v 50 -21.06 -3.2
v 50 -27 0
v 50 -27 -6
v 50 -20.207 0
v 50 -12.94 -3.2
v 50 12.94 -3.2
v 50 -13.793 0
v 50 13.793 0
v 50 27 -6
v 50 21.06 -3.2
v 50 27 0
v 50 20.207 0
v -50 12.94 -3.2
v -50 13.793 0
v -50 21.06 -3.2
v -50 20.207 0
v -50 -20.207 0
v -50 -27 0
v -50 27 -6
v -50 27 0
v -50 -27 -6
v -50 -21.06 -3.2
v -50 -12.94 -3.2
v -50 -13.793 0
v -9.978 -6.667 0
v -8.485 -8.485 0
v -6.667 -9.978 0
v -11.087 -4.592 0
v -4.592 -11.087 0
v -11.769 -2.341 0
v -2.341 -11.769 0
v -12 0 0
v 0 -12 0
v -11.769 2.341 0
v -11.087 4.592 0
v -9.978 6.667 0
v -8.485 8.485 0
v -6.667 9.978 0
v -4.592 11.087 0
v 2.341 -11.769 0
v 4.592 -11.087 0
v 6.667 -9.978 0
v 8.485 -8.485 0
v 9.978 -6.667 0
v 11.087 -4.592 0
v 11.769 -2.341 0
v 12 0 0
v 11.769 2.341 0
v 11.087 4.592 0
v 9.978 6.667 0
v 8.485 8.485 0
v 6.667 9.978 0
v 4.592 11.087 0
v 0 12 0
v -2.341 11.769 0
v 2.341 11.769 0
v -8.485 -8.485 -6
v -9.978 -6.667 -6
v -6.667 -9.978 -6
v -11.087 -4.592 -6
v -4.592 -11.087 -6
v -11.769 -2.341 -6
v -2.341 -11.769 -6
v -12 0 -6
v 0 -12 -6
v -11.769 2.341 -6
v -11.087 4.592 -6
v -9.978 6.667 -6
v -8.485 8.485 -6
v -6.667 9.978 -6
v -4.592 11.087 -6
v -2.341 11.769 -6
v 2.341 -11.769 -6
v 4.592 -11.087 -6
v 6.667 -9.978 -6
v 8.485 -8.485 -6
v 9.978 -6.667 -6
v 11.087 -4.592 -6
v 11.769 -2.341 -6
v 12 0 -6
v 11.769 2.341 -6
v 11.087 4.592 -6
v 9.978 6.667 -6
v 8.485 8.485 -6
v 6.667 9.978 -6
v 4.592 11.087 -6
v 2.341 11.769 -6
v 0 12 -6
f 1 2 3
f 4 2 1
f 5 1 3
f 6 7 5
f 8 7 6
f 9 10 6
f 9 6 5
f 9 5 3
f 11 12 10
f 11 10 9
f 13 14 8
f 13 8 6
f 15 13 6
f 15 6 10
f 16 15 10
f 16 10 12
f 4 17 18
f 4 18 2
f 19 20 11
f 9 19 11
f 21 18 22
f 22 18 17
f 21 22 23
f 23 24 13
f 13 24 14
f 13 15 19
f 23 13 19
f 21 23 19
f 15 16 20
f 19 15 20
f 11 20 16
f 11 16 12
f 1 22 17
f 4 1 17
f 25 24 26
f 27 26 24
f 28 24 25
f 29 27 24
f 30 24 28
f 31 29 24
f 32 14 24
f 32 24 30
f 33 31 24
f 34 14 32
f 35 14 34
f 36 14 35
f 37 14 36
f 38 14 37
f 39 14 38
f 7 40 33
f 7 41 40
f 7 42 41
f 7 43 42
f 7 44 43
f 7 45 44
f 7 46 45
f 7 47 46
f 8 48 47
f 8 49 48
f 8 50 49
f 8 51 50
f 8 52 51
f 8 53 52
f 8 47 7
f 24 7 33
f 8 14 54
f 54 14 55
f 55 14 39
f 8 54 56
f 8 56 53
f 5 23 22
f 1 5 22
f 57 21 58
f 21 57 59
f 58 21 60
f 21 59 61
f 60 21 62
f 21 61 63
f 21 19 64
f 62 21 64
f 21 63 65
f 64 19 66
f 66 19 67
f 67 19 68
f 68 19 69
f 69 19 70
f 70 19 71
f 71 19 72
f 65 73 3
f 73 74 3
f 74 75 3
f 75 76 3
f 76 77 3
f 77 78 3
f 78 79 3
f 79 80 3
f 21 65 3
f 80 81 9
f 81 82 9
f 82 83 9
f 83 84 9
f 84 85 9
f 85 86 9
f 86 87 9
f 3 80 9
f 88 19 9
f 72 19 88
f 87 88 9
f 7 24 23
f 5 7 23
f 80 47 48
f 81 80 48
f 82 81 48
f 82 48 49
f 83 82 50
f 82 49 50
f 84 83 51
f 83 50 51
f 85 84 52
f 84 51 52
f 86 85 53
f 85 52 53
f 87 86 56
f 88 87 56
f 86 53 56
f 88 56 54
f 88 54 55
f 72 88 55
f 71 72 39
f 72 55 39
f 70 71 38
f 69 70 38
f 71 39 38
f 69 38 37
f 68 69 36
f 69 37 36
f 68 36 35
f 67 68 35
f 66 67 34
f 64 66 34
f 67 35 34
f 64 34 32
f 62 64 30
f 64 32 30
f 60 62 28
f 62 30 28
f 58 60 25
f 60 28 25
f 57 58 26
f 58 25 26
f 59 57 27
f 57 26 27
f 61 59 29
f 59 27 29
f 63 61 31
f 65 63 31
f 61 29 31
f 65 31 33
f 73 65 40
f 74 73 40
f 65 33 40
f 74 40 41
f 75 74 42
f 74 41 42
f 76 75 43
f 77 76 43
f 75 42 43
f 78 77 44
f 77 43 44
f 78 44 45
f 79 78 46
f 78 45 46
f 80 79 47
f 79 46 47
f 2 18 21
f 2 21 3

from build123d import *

# Parameters (mm, degrees)
PLATE_PROFILE_W             = 100
PLATE_PROFILE_H             = 54
PLATE_PROFILE_R             = 12
PLATE_6MM_DEPTH             = 6
DOVETAIL_GROOVES_DEPTH      = 58.140178509
DOVETAIL_GROOVES_DEPTH_BACK = 58.140178509


with BuildPart() as part:
    # Plate profile → Plate 6mm (new body)
    with BuildSketch(Plane.XY):
        Rectangle(PLATE_PROFILE_W, PLATE_PROFILE_H)
        Circle(PLATE_PROFILE_R, mode=Mode.SUBTRACT)
    extrude(amount=-PLATE_6MM_DEPTH)

    # Groove profiles → Dovetail grooves (cut, two sides: drawn at the far end of the back side and taken through both)
    with BuildSketch(Plane(origin=(0, 0, 0), x_dir=(0, 0, -1), z_dir=(1, 0, 0)).offset(-DOVETAIL_GROOVES_DEPTH_BACK)):
        Polygon((-0.2, 13.846344337), (3.2, 12.939677671), (3.2, 21.060322329), (-0.2, 20.153655663), align=None)
        Polygon((-0.2, -13.846344337), (3.2, -12.939677671), (3.2, -21.060322329), (-0.2, -20.153655663), align=None)
    extrude(amount=DOVETAIL_GROOVES_DEPTH + DOVETAIL_GROOVES_DEPTH_BACK, mode=Mode.SUBTRACT)


solid = part.part
